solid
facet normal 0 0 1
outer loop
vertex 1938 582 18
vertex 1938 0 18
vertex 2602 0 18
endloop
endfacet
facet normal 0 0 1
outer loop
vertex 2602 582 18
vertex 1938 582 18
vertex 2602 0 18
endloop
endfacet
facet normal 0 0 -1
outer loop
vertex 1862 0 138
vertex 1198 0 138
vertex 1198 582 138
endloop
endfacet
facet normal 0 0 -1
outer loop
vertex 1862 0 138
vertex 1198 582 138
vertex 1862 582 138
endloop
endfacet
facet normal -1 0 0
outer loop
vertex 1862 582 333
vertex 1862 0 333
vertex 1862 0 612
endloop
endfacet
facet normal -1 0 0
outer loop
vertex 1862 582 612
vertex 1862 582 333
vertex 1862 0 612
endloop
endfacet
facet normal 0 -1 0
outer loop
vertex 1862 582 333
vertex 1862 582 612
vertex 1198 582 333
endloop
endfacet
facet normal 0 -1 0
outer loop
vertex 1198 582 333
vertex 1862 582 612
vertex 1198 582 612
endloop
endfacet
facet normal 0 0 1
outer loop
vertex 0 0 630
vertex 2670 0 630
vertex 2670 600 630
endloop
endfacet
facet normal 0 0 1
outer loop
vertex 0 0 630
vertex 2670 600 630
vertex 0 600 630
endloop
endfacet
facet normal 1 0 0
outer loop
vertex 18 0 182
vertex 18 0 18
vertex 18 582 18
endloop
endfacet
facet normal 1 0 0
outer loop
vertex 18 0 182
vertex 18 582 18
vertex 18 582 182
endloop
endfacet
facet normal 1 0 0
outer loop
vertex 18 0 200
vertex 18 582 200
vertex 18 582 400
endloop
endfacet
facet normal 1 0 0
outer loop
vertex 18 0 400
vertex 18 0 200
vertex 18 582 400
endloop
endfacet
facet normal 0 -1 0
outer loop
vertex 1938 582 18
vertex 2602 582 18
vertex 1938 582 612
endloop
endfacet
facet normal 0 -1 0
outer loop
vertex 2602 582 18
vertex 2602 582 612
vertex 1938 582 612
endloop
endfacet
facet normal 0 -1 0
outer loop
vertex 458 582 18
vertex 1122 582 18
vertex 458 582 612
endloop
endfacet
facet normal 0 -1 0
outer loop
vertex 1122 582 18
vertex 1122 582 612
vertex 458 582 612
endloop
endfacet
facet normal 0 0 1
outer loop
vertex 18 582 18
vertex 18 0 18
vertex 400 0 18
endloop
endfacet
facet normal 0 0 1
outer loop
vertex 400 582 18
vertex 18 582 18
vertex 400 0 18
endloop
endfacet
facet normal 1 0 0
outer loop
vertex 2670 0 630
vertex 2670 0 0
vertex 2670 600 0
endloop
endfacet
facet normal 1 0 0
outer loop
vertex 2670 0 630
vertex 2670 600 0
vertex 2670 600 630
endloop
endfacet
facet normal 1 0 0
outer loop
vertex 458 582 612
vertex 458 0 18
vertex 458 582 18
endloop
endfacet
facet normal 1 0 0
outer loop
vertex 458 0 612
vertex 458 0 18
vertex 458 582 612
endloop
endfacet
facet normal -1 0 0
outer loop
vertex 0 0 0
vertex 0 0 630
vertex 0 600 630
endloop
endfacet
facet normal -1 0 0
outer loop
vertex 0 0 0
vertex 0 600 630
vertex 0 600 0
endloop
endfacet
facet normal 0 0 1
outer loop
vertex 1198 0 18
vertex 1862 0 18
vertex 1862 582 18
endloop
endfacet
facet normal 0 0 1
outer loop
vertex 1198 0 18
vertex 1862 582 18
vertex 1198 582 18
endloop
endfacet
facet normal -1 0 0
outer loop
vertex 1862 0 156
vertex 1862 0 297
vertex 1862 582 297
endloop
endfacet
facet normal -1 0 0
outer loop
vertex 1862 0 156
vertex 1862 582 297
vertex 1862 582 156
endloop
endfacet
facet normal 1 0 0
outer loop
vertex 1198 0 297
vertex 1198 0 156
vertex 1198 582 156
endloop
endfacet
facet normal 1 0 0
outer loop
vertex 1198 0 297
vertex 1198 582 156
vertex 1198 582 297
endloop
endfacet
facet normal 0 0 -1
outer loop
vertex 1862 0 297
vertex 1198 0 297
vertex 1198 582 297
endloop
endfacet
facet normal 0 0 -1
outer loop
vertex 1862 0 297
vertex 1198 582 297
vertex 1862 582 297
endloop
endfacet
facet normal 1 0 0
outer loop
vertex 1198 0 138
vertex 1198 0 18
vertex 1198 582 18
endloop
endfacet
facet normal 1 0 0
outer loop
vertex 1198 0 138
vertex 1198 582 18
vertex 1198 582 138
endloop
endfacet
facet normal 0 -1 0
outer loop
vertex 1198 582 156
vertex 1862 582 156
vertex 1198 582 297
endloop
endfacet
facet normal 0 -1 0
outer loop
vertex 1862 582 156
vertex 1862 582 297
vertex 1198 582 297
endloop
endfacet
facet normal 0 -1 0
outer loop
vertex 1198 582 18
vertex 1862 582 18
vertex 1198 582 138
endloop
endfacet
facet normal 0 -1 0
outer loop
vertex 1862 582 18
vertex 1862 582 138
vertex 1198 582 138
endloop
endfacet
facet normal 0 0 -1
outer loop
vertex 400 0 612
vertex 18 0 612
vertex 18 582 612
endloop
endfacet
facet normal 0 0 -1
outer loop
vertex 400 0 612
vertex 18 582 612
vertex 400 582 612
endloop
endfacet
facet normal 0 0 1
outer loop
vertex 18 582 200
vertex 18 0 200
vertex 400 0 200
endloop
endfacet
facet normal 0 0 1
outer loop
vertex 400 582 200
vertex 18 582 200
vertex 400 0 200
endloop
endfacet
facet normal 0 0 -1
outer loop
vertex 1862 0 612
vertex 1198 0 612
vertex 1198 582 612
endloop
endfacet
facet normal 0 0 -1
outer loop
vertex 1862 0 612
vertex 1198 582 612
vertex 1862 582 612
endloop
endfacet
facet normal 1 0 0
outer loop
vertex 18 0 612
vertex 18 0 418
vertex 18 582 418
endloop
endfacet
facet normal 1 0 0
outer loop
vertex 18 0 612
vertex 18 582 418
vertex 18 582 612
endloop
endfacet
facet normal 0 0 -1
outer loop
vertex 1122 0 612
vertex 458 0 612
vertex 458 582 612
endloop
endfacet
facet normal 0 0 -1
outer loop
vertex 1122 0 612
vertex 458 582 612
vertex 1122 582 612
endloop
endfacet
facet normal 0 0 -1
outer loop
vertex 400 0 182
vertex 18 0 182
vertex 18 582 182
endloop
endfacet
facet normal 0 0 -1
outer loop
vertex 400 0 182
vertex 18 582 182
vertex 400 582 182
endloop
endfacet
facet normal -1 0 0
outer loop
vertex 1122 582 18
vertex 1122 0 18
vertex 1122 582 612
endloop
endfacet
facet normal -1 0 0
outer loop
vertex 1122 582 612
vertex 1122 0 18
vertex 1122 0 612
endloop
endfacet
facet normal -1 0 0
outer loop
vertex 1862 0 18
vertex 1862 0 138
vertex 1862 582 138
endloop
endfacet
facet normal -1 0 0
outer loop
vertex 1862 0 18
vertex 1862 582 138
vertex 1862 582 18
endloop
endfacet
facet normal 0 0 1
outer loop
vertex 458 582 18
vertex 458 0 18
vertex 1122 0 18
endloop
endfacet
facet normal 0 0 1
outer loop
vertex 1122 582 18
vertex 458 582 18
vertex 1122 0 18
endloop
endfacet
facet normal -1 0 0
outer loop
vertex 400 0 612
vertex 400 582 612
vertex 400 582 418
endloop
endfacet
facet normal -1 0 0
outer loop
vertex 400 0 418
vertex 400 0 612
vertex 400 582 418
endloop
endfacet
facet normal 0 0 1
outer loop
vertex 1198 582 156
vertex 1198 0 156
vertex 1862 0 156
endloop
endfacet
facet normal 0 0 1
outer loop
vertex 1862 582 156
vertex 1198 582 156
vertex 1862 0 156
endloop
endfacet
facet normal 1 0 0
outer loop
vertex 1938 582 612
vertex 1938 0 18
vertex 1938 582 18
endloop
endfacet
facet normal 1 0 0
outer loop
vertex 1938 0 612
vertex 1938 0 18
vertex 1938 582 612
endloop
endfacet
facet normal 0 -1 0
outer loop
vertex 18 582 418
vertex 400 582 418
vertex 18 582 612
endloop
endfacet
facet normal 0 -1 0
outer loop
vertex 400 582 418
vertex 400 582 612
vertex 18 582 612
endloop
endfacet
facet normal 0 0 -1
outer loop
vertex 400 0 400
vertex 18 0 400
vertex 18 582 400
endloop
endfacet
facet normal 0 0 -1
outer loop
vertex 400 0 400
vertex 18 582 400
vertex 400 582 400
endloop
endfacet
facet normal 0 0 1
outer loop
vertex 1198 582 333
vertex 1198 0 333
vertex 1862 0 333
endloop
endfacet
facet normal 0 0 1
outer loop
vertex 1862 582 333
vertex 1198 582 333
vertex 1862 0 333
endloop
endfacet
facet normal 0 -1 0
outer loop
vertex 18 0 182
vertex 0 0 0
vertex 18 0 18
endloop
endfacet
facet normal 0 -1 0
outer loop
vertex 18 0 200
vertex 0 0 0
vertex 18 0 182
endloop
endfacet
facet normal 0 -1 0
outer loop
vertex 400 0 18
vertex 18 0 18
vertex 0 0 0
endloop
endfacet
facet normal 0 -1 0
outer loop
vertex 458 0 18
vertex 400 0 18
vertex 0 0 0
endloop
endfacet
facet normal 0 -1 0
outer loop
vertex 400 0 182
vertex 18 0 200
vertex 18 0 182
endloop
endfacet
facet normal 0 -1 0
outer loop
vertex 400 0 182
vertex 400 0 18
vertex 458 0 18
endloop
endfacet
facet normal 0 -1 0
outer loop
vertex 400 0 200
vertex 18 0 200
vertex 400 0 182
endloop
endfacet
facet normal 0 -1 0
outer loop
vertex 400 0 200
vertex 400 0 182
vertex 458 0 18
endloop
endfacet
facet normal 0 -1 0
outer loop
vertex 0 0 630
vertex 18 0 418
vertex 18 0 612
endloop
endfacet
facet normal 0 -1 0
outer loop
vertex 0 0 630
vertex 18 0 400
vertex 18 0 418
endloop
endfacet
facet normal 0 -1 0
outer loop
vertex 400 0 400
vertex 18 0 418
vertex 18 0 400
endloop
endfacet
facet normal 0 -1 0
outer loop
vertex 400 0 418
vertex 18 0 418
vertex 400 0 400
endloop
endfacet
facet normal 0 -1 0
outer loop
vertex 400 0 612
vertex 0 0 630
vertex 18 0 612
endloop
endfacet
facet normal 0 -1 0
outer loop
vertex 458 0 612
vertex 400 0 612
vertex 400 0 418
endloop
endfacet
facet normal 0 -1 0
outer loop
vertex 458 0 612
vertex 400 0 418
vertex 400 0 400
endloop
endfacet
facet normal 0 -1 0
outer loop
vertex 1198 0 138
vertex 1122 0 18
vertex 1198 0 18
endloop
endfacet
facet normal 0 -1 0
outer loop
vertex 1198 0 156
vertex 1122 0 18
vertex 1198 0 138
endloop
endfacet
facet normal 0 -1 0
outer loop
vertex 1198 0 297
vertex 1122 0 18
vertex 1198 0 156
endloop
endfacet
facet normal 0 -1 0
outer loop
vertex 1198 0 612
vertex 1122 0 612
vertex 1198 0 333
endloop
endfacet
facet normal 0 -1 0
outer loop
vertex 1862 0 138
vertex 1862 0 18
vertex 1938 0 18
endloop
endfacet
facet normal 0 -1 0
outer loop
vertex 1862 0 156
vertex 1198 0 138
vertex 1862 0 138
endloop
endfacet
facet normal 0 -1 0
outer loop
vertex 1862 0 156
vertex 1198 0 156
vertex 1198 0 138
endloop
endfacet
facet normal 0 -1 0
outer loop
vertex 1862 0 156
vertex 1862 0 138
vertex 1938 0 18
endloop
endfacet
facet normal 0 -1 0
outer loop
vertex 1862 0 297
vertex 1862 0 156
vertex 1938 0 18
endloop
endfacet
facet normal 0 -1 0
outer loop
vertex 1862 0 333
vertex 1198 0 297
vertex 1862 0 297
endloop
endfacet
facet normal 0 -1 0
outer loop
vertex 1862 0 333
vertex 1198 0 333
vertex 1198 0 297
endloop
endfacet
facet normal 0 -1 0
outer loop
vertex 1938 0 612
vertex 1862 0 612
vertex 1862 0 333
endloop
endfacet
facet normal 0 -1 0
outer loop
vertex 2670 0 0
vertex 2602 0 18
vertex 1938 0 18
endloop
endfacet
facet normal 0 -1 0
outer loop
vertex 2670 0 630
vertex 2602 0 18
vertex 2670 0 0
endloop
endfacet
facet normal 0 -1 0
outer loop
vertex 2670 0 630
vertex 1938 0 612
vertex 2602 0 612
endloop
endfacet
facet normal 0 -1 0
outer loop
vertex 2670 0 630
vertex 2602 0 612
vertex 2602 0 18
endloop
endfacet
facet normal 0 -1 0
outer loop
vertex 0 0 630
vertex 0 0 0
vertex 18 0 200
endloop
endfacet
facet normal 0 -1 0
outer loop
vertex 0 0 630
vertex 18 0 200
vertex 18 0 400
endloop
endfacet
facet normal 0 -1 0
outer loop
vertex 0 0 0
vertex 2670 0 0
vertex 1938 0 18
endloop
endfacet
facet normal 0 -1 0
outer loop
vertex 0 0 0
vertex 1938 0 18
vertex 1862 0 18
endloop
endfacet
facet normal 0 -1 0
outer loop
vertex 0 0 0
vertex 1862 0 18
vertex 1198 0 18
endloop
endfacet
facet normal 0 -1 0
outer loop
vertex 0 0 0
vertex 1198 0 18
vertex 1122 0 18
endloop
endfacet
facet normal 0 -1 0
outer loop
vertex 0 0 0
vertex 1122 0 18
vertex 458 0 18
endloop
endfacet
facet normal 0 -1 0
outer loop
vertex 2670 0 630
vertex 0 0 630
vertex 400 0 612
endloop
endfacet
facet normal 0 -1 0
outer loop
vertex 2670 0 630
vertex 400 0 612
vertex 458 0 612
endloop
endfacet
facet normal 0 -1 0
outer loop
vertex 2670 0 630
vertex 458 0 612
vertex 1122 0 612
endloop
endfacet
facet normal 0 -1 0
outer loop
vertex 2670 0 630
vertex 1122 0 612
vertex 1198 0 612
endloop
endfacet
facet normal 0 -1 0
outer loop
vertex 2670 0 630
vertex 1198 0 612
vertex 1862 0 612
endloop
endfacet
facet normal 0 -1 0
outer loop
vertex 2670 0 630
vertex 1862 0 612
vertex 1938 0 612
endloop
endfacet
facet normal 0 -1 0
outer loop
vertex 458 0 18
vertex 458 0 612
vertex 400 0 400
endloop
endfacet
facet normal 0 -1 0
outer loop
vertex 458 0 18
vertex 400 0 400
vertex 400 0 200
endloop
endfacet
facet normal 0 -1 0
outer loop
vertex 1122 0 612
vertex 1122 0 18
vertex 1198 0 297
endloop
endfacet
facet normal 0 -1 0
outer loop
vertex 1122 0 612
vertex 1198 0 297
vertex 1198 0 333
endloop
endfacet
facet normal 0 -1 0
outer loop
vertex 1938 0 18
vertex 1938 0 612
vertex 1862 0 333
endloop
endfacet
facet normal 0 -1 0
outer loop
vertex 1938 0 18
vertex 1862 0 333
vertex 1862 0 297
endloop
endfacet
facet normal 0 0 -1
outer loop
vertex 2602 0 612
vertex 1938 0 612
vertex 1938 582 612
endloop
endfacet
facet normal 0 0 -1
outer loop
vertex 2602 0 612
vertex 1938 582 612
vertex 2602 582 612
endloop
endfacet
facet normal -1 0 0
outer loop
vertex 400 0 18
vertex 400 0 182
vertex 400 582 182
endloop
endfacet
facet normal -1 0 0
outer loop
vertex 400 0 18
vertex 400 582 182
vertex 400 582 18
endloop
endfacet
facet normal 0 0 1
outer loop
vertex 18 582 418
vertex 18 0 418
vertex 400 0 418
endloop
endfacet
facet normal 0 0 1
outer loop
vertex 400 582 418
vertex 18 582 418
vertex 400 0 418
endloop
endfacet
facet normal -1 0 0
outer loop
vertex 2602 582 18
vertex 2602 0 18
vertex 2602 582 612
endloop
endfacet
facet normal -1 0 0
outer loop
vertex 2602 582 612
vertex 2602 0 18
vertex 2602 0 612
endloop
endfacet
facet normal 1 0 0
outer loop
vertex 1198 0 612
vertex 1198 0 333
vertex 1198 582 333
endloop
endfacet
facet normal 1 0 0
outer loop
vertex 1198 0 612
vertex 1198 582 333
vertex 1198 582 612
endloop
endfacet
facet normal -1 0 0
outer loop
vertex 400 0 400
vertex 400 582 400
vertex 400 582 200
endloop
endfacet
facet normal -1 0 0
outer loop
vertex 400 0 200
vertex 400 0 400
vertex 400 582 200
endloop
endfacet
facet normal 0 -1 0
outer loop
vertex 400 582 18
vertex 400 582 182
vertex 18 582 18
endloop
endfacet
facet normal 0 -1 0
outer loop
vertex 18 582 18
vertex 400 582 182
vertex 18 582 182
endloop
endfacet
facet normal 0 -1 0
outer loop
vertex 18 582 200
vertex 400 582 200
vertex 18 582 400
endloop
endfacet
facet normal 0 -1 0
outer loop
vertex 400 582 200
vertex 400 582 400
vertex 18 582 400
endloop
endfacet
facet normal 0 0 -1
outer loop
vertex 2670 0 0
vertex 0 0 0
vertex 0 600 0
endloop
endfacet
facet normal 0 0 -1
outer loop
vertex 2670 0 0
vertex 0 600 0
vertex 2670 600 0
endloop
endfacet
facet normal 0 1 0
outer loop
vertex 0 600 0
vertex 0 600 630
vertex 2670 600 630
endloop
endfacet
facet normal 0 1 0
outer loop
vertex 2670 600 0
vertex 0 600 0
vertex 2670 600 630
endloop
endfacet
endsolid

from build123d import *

# Parameters (mm, degrees)
F0_W     = 382
F0_H     = 18
F0_W_2   = 700
F0_H_2   = 630
F0_W_3   = 664
F0_H_3   = 594
F0_H_4   = 315
F0_H_5   = 279
F0_W_4   = 50
F1_DEPTH = 600
F2_W     = 2670
F2_H     = 630
F3_DEPTH = 18


with BuildPart() as f1:
    # F0 (on Front) → F1 (new body)
    with BuildSketch(Plane.XZ):
        with Locations((209, 9)):
            Rectangle(F0_W, F0_H)
        Polygon((0, 630), (0, 0), (18, 0), (18, 18), (18, 182), (18, 200), (18, 400), (18, 418), (18, 612), (400, 612), (400, 418), (400, 400), (400, 200), (400, 182), (400, 18), (400, 0), (440, 0), (440, 630), (400, 630), align=None)
        with Locations((790, 315)):
            Rectangle(F0_W_2, F0_H_2)
        with Locations((790, 315)):
            Rectangle(F0_W_3, F0_H_3, mode=Mode.SUBTRACT)
        Polygon((1140, 630), (1140, 0), (1180, 0), (1180, 315), (1180, 630), align=None)
        with Locations((1530, 472.5)):
            Rectangle(F0_W_2, F0_H_4)
        with Locations((1530, 472.5)):
            Rectangle(F0_W_3, F0_H_5, mode=Mode.SUBTRACT)
        with Locations((1530, 157.5)):
            Rectangle(F0_W_2, F0_H_4)
        Polygon((1198, 297), (1862, 297), (1862, 156), (1862, 138), (1862, 18), (1198, 18), (1198, 138), (1198, 156), align=None, mode=Mode.SUBTRACT)
        Polygon((1880, 315), (1880, 0), (1920, 0), (1920, 315), (1920, 630), (1880, 630), align=None)
        Polygon((1920, 315), (1920, 0), (2620, 0), (2620, 630), (1920, 630), align=None)
        with Locations((2270, 315)):
            Rectangle(F0_W_3, F0_H_3, mode=Mode.SUBTRACT)
        with Locations((2645, 315)):
            Rectangle(F0_W_4, F0_H_2)
        with Locations((209, 191)):
            Rectangle(F0_W, F0_H)
        with Locations((209, 409)):
            Rectangle(F0_W, F0_H)
        with Locations((1530, 147)):
            Rectangle(F0_W_3, F0_H)
    extrude(amount=-F1_DEPTH)

    # F2 (on face) → F3 (join)
    with BuildSketch(Plane(origin=(0, 600, 0), x_dir=(-1, 0, 0), z_dir=(0, 1, 0))):
        with Locations((-1335, 315)):
            Rectangle(F2_W, F2_H)
    extrude(amount=-F3_DEPTH)


solid = f1.part
